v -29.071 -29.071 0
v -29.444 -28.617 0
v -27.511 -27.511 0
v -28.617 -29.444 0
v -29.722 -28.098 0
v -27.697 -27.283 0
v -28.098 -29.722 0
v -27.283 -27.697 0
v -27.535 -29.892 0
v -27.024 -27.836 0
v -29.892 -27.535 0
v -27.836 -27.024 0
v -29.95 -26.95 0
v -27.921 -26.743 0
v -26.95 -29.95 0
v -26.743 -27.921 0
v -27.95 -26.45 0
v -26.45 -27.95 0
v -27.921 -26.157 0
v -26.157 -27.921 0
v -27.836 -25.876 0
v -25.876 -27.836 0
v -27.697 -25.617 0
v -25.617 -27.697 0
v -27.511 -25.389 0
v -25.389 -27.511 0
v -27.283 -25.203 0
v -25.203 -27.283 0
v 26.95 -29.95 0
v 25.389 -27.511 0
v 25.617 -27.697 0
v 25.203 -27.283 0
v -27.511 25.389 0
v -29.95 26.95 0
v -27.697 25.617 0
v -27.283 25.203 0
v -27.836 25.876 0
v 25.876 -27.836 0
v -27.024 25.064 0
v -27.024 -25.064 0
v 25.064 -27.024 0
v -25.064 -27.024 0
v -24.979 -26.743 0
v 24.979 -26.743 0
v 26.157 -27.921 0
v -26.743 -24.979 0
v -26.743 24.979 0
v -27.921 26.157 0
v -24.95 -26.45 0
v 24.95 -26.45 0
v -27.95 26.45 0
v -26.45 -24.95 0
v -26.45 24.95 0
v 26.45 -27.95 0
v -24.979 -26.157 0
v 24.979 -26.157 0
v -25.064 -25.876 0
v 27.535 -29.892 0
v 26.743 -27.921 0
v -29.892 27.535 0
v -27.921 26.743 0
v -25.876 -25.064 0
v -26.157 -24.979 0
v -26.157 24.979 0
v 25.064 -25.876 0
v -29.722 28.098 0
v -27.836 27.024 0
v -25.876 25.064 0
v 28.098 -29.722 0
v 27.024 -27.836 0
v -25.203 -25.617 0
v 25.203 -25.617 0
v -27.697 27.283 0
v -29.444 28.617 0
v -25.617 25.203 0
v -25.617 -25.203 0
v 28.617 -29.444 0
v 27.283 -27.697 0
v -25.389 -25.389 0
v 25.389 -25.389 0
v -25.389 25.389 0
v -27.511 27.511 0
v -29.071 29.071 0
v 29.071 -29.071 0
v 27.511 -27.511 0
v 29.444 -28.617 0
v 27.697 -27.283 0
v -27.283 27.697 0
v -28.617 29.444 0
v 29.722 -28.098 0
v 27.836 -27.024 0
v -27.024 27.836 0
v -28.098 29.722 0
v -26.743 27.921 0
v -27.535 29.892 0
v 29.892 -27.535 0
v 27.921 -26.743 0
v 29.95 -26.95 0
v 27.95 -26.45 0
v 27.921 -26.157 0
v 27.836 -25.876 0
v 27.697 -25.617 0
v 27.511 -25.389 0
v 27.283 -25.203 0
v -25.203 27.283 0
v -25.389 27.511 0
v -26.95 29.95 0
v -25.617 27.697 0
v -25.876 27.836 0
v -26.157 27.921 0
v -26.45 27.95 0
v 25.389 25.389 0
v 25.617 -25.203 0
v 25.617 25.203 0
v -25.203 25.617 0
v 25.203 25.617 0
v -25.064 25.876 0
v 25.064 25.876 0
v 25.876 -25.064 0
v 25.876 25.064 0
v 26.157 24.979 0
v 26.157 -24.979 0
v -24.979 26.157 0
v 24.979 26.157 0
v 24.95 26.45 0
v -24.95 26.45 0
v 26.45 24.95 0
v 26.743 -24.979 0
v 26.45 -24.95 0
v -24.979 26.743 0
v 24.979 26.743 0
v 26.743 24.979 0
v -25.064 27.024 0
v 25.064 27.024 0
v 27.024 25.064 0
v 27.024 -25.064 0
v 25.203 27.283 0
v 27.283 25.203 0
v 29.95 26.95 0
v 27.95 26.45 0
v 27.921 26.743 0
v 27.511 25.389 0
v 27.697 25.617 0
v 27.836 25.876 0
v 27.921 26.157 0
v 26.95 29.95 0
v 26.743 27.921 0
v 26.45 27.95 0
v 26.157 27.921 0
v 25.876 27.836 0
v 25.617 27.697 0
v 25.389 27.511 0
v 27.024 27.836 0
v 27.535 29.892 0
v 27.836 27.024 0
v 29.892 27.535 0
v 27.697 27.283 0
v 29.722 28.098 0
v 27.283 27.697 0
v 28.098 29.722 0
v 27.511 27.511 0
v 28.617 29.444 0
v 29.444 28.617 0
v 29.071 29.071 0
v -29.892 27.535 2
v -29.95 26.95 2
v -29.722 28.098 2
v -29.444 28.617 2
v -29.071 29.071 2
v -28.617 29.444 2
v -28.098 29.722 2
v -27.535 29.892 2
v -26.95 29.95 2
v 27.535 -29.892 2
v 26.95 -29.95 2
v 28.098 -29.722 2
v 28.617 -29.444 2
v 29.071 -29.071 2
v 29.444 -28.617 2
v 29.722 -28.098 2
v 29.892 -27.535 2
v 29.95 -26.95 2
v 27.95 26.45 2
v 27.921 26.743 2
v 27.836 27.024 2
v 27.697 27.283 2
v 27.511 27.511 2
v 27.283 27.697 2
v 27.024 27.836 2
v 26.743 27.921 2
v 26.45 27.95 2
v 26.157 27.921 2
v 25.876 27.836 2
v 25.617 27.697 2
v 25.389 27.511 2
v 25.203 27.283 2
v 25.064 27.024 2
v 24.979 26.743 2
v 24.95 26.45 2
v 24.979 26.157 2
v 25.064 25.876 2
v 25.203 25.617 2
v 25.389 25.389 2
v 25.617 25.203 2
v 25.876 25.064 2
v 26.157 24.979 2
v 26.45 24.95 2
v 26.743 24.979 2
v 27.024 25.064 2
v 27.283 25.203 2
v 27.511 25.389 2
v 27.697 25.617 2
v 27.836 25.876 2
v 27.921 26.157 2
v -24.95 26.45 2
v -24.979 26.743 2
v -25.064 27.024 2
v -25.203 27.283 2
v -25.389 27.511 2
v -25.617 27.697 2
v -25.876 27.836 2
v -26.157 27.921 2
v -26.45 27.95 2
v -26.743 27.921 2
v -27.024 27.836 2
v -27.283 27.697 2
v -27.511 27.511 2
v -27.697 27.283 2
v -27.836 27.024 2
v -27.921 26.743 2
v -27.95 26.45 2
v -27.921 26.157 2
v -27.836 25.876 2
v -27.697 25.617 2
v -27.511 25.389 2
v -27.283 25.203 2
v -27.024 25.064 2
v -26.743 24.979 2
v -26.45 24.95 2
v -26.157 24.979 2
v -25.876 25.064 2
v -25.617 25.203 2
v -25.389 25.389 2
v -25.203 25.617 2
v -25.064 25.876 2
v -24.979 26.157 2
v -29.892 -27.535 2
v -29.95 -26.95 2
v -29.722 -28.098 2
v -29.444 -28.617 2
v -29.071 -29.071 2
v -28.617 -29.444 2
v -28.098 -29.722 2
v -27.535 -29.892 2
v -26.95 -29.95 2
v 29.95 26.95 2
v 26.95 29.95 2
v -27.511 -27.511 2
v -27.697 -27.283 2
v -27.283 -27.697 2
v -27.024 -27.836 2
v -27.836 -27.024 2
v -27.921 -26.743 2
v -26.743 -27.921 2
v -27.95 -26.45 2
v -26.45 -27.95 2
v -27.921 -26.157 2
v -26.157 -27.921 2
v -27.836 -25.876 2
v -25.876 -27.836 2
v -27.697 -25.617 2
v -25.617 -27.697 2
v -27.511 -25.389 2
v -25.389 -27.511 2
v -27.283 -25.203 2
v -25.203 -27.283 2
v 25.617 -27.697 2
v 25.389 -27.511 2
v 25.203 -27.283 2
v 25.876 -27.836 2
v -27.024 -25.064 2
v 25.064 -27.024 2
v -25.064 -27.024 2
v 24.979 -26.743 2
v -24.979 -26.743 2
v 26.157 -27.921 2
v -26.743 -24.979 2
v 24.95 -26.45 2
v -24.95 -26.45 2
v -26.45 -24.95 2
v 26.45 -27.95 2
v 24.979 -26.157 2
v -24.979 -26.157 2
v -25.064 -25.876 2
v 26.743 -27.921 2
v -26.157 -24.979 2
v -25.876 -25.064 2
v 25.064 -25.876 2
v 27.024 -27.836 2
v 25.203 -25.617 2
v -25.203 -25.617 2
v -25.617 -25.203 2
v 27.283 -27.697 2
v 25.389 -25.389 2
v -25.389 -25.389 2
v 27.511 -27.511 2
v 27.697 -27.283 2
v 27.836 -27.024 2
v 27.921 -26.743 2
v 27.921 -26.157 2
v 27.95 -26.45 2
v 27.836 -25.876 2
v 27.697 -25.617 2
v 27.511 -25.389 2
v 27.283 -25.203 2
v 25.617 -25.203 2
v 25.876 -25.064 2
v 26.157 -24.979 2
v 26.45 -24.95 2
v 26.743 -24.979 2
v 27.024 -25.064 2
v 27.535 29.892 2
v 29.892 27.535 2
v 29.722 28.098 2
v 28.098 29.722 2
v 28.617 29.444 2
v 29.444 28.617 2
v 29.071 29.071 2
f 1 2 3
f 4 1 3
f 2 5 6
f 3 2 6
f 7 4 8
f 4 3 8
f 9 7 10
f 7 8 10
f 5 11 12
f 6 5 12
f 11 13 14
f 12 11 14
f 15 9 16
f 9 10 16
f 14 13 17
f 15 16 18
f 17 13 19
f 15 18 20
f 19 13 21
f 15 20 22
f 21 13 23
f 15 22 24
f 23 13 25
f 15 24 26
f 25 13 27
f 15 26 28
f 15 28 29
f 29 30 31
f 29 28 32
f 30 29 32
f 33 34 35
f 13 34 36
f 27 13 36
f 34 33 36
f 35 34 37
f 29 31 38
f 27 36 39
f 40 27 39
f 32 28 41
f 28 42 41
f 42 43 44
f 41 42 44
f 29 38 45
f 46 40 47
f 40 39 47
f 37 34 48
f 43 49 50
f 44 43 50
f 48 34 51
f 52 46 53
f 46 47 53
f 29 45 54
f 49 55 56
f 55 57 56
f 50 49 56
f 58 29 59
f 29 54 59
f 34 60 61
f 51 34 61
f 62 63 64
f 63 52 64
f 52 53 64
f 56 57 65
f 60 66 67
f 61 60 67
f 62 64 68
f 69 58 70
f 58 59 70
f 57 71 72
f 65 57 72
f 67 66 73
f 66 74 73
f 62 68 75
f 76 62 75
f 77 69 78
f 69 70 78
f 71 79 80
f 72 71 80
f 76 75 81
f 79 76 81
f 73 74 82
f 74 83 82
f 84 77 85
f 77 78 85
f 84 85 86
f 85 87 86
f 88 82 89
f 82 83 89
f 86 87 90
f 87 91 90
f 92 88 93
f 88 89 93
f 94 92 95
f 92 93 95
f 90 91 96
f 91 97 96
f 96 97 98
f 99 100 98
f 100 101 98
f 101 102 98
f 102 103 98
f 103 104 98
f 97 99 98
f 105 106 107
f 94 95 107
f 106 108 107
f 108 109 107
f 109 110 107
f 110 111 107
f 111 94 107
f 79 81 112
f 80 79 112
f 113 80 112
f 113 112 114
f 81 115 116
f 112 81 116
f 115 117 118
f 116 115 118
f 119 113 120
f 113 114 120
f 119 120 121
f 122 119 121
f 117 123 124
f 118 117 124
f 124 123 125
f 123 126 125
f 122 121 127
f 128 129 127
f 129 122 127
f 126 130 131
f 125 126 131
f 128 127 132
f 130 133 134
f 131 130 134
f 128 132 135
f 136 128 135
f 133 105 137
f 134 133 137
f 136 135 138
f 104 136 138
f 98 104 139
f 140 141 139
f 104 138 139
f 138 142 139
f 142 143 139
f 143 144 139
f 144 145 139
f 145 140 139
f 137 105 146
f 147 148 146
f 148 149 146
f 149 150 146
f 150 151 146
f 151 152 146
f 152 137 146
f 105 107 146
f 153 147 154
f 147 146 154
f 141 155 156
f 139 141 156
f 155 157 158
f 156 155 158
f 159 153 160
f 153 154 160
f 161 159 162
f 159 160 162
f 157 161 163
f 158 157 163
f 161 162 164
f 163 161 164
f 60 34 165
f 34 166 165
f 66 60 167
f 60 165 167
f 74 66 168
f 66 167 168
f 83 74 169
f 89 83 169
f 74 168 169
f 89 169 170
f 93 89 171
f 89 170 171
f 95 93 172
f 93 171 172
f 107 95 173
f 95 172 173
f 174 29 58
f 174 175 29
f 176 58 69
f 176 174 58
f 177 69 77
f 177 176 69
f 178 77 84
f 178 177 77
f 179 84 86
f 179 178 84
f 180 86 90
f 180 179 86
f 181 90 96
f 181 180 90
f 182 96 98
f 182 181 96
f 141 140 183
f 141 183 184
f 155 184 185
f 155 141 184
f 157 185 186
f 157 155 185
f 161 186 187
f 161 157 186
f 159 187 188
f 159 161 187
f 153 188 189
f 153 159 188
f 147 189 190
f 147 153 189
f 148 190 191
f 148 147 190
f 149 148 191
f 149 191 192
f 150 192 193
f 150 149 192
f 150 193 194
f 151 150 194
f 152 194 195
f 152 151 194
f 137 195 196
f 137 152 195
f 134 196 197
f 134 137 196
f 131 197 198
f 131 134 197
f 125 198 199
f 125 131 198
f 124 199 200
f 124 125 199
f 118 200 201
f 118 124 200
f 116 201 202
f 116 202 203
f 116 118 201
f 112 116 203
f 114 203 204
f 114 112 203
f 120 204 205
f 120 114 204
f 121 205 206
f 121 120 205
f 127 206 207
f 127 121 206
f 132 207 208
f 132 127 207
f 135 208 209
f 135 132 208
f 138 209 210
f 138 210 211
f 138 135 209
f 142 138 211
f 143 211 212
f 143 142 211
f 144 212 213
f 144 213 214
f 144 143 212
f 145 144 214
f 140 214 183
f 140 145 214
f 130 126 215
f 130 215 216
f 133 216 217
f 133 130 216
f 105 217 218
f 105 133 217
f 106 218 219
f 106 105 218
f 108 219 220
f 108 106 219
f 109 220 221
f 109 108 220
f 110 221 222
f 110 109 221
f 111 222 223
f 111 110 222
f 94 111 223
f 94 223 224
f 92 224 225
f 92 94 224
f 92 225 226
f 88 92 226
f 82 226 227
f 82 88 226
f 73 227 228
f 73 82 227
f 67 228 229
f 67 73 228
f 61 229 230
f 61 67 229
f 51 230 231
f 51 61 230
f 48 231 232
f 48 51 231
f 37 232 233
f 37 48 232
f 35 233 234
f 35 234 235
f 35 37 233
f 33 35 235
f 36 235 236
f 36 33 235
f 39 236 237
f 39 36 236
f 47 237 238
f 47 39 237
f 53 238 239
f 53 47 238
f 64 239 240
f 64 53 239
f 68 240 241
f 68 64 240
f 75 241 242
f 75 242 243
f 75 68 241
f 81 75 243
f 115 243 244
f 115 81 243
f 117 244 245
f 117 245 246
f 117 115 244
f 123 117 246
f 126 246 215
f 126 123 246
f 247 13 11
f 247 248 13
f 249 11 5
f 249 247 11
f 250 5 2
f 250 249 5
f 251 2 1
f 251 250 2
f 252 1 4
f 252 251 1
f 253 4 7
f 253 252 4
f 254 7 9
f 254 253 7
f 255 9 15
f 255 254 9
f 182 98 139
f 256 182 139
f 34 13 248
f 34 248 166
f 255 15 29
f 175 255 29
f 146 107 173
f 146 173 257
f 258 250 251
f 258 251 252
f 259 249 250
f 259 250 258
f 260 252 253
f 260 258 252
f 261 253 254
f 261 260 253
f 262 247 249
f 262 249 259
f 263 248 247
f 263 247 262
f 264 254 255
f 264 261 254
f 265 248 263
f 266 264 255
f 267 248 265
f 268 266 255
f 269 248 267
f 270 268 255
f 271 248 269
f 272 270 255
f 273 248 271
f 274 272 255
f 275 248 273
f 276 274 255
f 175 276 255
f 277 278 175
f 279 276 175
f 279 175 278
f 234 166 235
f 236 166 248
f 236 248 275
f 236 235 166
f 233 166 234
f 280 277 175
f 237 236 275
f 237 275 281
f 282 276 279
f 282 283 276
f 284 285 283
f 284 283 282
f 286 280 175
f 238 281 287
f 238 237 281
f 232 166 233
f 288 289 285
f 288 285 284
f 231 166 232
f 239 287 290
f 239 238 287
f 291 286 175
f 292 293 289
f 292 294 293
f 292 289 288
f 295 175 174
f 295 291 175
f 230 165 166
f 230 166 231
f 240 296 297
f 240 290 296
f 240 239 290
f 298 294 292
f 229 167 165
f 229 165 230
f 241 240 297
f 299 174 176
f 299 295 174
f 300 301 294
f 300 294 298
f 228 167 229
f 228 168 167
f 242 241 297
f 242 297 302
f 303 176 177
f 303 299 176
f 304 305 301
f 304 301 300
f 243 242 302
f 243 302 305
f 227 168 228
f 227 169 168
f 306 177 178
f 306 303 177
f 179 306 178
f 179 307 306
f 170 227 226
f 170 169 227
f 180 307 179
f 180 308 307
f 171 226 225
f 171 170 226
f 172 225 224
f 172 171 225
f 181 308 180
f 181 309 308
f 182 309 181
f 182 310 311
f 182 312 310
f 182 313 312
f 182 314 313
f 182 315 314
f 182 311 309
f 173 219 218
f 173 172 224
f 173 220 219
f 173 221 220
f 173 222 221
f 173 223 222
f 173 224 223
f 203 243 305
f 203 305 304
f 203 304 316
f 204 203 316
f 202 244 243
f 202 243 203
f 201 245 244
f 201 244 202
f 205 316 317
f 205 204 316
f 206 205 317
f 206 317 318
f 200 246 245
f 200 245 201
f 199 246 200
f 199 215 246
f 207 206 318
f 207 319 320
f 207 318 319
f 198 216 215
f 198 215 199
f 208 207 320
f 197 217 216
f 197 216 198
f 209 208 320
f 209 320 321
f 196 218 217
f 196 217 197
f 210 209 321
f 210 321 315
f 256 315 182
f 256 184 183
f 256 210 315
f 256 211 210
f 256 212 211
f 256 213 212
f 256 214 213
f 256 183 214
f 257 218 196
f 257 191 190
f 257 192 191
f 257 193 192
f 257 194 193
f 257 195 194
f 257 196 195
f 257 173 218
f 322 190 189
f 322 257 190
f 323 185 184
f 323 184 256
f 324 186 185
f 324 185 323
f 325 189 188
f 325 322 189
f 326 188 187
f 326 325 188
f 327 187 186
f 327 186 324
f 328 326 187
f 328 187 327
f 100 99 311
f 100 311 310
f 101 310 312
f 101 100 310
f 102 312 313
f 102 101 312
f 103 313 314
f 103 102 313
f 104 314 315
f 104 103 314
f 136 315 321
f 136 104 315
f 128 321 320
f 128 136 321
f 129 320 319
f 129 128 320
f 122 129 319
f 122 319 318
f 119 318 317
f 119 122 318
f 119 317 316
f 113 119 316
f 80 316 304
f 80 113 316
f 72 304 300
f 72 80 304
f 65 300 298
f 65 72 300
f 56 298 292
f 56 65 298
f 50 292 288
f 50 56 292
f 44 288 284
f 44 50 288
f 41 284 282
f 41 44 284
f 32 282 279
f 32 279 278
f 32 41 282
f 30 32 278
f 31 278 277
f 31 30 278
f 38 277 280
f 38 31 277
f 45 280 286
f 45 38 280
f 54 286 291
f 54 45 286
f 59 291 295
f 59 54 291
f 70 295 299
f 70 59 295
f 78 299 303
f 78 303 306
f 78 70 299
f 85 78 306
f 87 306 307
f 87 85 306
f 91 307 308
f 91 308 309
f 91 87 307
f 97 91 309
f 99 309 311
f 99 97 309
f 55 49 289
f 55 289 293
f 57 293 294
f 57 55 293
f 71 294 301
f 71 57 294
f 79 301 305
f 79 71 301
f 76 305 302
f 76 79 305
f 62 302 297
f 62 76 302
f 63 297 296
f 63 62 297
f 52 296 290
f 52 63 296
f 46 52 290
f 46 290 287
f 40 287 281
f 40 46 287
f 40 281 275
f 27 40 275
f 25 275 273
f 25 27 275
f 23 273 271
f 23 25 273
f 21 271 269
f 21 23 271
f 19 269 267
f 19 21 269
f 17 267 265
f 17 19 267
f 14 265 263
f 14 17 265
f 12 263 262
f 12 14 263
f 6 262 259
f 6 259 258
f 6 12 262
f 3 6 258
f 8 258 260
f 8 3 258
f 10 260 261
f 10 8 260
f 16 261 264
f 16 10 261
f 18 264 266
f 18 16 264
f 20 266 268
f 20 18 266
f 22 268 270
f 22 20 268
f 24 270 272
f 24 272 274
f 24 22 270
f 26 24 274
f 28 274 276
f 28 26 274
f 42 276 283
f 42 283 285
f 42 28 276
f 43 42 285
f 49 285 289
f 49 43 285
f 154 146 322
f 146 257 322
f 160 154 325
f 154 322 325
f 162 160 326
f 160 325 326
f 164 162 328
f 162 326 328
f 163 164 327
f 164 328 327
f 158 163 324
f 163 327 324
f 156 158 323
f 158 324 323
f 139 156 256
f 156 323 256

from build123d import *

# Parameters (mm, degrees)
SKETCH1_W           = 59.9
SKETCH1_H           = 59.9
SKETCH1_R           = 1.5
BOSS_EXTRUDE1_DEPTH = 2
FILLET1_R           = 3


with BuildPart() as part:
    # Sketch1 → Boss-Extrude1 (new body)
    with BuildSketch(Plane.XY):
        Rectangle(SKETCH1_W, SKETCH1_H)
        with Locations((-26.45, -26.45)):
            Circle(SKETCH1_R, mode=Mode.SUBTRACT)
        with Locations((26.45, -26.45)):
            Circle(SKETCH1_R, mode=Mode.SUBTRACT)
        with Locations((-26.45, 26.45)):
            Circle(SKETCH1_R, mode=Mode.SUBTRACT)
        with Locations((26.45, 26.45)):
            Circle(SKETCH1_R, mode=Mode.SUBTRACT)
    extrude(amount=BOSS_EXTRUDE1_DEPTH)

    # Fillet1
    fillet1_edges = [part.edges().sort_by_distance(p)[0] for p in [
        (29.95, -29.95, 1),
        (-29.95, -29.95, 1),
        (-29.95, 29.95, 1),
        (29.95, 29.95, 1),
    ]]
    fillet(fillet1_edges, radius=FILLET1_R)


solid = part.part
